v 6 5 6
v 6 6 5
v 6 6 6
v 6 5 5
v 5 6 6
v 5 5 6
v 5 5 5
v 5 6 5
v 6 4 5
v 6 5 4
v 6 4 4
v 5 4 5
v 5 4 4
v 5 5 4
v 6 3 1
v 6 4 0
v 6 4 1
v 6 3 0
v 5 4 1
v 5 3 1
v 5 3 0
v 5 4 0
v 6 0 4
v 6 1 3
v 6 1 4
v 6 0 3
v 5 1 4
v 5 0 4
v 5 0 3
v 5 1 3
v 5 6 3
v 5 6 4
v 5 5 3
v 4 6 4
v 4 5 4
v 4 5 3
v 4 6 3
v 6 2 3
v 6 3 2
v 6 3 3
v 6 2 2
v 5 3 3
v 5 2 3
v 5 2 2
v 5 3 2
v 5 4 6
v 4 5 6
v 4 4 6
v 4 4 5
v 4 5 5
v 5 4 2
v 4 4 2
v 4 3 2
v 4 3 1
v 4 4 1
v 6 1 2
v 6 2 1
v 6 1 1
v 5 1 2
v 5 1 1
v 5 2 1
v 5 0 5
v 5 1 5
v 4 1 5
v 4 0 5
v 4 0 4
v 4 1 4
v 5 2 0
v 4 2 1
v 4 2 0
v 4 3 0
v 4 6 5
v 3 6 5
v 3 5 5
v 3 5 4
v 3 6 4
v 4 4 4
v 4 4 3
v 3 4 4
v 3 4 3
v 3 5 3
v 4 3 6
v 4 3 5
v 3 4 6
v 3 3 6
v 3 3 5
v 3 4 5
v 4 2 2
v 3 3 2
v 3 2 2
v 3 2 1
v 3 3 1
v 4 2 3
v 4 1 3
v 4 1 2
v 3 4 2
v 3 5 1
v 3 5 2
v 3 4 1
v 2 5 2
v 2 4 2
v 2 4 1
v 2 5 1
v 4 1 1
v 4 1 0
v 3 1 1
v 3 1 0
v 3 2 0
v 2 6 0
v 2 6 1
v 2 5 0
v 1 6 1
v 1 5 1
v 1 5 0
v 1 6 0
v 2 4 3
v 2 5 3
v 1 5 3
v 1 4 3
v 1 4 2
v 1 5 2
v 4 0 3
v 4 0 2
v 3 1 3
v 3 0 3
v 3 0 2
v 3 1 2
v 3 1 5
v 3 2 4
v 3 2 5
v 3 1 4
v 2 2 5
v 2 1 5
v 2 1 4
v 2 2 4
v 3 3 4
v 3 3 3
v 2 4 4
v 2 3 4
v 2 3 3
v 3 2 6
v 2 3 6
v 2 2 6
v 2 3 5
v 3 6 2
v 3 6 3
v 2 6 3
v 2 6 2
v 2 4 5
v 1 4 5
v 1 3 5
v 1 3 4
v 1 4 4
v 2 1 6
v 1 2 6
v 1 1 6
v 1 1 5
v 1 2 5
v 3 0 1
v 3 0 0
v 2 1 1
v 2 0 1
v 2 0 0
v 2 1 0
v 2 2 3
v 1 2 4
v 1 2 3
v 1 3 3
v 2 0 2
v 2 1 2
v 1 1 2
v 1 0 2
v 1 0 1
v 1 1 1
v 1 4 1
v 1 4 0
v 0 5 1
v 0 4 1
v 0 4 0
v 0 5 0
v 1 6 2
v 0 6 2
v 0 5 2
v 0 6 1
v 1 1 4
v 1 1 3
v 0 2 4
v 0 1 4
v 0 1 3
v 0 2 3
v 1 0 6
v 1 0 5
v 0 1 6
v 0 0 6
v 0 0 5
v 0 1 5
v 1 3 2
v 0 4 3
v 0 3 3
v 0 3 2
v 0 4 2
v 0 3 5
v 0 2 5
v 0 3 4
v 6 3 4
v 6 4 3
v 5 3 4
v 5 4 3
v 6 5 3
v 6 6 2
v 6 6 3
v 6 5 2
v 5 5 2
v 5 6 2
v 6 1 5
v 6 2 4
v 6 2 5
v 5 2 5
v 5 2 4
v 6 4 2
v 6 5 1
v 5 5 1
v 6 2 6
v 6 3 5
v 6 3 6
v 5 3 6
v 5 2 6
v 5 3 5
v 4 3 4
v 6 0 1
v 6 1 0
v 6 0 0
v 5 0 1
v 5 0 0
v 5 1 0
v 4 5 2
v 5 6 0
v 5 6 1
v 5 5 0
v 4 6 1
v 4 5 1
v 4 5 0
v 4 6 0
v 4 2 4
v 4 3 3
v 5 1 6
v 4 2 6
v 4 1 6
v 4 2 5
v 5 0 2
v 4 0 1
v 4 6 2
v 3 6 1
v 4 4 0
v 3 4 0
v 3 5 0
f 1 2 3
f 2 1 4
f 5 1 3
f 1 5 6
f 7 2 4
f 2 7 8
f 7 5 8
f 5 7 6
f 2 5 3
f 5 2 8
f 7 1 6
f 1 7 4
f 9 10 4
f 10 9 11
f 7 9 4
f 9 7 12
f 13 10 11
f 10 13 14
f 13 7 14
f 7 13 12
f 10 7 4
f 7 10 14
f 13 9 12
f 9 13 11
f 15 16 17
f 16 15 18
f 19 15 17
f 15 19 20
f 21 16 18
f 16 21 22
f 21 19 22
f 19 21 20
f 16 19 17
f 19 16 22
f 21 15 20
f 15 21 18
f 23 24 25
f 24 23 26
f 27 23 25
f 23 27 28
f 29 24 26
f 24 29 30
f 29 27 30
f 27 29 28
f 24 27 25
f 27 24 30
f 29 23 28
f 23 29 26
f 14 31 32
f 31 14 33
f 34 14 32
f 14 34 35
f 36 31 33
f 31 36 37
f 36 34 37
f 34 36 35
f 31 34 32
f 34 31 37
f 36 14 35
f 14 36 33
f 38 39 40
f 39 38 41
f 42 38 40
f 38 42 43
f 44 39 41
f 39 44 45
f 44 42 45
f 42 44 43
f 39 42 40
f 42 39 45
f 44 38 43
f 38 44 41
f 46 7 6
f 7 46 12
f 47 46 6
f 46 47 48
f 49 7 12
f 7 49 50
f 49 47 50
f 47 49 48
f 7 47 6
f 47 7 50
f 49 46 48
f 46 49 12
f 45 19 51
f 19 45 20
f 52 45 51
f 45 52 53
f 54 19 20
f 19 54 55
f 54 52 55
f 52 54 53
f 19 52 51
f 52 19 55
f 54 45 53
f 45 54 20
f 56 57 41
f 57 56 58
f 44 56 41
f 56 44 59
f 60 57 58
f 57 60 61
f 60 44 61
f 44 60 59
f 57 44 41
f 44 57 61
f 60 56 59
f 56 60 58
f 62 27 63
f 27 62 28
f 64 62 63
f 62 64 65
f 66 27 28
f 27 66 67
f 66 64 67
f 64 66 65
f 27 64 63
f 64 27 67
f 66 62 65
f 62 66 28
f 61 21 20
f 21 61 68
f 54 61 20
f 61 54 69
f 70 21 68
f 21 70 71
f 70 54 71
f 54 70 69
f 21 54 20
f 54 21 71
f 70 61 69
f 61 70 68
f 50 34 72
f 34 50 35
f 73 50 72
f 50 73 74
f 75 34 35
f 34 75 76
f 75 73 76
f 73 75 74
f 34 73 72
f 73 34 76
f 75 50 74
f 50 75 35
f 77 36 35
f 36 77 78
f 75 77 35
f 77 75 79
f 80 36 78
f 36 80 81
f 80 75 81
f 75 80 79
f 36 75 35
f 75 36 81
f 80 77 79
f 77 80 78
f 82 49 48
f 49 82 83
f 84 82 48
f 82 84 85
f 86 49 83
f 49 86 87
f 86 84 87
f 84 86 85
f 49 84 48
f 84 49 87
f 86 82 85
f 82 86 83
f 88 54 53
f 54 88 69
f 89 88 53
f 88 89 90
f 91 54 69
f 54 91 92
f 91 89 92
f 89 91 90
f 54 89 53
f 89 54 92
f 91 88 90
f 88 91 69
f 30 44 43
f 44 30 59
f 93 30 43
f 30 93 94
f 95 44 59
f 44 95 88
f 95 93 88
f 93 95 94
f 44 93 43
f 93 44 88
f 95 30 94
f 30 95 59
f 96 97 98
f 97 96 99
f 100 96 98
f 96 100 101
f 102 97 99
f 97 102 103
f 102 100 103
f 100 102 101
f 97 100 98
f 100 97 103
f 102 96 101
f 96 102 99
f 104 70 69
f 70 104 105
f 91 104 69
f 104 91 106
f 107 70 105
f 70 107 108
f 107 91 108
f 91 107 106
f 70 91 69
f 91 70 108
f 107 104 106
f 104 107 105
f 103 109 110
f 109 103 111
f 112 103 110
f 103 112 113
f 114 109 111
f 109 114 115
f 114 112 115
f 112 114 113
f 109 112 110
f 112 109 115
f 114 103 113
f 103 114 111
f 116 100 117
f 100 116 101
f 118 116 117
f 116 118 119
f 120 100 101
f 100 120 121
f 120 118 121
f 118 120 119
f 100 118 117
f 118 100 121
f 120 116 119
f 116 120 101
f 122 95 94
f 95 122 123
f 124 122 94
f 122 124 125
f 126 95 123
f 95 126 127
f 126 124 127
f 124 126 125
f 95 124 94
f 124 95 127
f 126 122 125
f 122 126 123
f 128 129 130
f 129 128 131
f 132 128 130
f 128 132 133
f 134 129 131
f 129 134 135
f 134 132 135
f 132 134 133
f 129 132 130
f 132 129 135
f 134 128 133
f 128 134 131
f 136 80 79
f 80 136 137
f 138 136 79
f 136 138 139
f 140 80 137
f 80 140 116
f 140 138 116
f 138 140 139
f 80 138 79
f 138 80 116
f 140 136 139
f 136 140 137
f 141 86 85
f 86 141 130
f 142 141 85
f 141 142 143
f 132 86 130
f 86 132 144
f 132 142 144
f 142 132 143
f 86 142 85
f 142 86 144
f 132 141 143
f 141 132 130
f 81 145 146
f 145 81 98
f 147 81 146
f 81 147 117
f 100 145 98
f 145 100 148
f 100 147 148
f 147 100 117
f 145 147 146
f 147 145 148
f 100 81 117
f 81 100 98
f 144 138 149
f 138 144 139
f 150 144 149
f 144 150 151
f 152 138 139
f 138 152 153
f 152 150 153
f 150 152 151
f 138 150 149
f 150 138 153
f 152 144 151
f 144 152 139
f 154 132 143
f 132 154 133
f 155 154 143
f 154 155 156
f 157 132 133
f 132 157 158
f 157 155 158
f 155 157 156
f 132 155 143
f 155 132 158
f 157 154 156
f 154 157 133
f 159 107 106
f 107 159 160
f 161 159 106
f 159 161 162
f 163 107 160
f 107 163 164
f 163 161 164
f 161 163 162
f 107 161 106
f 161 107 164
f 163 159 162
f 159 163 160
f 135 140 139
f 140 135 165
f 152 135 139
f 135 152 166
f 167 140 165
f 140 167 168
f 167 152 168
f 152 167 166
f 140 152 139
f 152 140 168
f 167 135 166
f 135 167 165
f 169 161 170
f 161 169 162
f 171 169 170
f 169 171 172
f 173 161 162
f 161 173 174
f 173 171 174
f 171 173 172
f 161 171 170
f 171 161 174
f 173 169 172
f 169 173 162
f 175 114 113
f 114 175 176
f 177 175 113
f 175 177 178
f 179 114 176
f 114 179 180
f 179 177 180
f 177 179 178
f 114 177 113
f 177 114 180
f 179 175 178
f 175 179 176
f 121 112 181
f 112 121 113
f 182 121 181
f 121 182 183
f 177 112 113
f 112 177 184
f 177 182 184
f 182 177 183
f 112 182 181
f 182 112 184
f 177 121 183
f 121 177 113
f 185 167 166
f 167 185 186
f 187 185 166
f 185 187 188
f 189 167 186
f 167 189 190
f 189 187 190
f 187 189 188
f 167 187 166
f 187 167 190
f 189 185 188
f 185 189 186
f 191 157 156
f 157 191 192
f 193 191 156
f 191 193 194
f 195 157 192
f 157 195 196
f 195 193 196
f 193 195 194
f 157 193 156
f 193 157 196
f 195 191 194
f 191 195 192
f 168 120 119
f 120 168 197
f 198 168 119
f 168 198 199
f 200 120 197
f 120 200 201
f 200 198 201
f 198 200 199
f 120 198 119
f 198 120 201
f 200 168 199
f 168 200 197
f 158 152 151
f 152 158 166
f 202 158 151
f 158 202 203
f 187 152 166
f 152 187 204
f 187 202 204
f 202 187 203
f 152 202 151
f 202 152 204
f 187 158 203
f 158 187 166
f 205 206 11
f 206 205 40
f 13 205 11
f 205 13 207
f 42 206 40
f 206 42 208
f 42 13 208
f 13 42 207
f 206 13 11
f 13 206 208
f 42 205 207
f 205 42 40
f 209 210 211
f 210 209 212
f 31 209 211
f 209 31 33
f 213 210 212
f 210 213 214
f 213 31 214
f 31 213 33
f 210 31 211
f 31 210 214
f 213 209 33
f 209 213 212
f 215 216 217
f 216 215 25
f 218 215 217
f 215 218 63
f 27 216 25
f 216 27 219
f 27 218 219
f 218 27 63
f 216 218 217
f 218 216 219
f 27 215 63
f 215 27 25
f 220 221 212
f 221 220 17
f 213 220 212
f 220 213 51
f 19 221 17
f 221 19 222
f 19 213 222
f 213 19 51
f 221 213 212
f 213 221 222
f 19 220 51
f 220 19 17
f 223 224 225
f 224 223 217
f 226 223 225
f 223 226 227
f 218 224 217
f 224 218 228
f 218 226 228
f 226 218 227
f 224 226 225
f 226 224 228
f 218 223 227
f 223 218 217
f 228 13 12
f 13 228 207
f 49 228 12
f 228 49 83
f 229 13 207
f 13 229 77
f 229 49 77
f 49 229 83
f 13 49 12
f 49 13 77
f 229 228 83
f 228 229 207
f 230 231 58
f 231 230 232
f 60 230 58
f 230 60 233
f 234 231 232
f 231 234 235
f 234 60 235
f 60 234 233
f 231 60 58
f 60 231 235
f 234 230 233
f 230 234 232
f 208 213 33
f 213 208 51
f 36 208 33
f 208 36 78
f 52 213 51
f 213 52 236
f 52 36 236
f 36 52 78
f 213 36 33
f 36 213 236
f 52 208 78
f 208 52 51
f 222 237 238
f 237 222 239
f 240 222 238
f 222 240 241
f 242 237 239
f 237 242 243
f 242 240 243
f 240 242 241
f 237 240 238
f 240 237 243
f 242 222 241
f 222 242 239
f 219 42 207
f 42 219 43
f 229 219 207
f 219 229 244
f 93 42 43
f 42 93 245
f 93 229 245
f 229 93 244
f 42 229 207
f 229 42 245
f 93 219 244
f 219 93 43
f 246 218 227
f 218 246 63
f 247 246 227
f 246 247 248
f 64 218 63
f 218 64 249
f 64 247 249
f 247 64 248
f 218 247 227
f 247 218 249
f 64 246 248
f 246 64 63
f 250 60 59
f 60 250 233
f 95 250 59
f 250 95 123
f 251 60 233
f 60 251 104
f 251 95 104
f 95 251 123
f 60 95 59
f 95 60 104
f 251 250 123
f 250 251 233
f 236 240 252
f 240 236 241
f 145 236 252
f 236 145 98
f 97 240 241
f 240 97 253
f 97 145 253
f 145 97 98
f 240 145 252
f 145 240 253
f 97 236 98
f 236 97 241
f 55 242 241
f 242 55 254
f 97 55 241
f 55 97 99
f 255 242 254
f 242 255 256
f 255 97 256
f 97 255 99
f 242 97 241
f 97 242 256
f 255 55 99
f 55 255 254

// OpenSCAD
union() {
    translate([5, 5, 5]) cube([1, 1, 1]);
    translate([5, 4, 4]) cube([1, 1, 1]);
    translate([5, 3, 0]) cube([1, 1, 1]);
    translate([5, 0, 3]) cube([1, 1, 1]);
    translate([4, 5, 3]) cube([1, 1, 1]);
    translate([5, 2, 2]) cube([1, 1, 1]);
    translate([4, 4, 5]) cube([1, 1, 1]);
    translate([4, 3, 1]) cube([1, 1, 1]);
    translate([5, 1, 1]) cube([1, 1, 1]);
    translate([4, 0, 4]) cube([1, 1, 1]);
    translate([4, 2, 0]) cube([1, 1, 1]);
    translate([3, 5, 4]) cube([1, 1, 1]);
    translate([3, 4, 3]) cube([1, 1, 1]);
    translate([3, 3, 5]) cube([1, 1, 1]);
    translate([3, 2, 1]) cube([1, 1, 1]);
    translate([4, 1, 2]) cube([1, 1, 1]);
    translate([2, 4, 1]) cube([1, 1, 1]);
    translate([3, 1, 0]) cube([1, 1, 1]);
    translate([1, 5, 0]) cube([1, 1, 1]);
    translate([1, 4, 2]) cube([1, 1, 1]);
    translate([3, 0, 2]) cube([1, 1, 1]);
    translate([2, 1, 4]) cube([1, 1, 1]);
    translate([2, 3, 3]) cube([1, 1, 1]);
    translate([2, 2, 5]) cube([1, 1, 1]);
    translate([2, 5, 2]) cube([1, 1, 1]);
    translate([1, 3, 4]) cube([1, 1, 1]);
    translate([1, 1, 5]) cube([1, 1, 1]);
    translate([2, 0, 0]) cube([1, 1, 1]);
    translate([1, 2, 3]) cube([1, 1, 1]);
    translate([1, 0, 1]) cube([1, 1, 1]);
    translate([0, 4, 0]) cube([1, 1, 1]);
    translate([0, 5, 1]) cube([1, 1, 1]);
    translate([0, 1, 3]) cube([1, 1, 1]);
    translate([0, 0, 5]) cube([1, 1, 1]);
    translate([0, 3, 2]) cube([1, 1, 1]);
    translate([0, 2, 4]) cube([1, 1, 1]);
    translate([5, 3, 3]) cube([1, 1, 1]);
    translate([5, 5, 2]) cube([1, 1, 1]);
    translate([5, 1, 4]) cube([1, 1, 1]);
    translate([5, 4, 1]) cube([1, 1, 1]);
    translate([5, 2, 5]) cube([1, 1, 1]);
    translate([4, 3, 4]) cube([1, 1, 1]);
    translate([5, 0, 0]) cube([1, 1, 1]);
    translate([4, 4, 2]) cube([1, 1, 1]);
    translate([4, 5, 0]) cube([1, 1, 1]);
    translate([4, 2, 3]) cube([1, 1, 1]);
    translate([4, 1, 5]) cube([1, 1, 1]);
    translate([4, 0, 1]) cube([1, 1, 1]);
    translate([3, 5, 1]) cube([1, 1, 1]);
    translate([3, 4, 0]) cube([1, 1, 1]);
}
